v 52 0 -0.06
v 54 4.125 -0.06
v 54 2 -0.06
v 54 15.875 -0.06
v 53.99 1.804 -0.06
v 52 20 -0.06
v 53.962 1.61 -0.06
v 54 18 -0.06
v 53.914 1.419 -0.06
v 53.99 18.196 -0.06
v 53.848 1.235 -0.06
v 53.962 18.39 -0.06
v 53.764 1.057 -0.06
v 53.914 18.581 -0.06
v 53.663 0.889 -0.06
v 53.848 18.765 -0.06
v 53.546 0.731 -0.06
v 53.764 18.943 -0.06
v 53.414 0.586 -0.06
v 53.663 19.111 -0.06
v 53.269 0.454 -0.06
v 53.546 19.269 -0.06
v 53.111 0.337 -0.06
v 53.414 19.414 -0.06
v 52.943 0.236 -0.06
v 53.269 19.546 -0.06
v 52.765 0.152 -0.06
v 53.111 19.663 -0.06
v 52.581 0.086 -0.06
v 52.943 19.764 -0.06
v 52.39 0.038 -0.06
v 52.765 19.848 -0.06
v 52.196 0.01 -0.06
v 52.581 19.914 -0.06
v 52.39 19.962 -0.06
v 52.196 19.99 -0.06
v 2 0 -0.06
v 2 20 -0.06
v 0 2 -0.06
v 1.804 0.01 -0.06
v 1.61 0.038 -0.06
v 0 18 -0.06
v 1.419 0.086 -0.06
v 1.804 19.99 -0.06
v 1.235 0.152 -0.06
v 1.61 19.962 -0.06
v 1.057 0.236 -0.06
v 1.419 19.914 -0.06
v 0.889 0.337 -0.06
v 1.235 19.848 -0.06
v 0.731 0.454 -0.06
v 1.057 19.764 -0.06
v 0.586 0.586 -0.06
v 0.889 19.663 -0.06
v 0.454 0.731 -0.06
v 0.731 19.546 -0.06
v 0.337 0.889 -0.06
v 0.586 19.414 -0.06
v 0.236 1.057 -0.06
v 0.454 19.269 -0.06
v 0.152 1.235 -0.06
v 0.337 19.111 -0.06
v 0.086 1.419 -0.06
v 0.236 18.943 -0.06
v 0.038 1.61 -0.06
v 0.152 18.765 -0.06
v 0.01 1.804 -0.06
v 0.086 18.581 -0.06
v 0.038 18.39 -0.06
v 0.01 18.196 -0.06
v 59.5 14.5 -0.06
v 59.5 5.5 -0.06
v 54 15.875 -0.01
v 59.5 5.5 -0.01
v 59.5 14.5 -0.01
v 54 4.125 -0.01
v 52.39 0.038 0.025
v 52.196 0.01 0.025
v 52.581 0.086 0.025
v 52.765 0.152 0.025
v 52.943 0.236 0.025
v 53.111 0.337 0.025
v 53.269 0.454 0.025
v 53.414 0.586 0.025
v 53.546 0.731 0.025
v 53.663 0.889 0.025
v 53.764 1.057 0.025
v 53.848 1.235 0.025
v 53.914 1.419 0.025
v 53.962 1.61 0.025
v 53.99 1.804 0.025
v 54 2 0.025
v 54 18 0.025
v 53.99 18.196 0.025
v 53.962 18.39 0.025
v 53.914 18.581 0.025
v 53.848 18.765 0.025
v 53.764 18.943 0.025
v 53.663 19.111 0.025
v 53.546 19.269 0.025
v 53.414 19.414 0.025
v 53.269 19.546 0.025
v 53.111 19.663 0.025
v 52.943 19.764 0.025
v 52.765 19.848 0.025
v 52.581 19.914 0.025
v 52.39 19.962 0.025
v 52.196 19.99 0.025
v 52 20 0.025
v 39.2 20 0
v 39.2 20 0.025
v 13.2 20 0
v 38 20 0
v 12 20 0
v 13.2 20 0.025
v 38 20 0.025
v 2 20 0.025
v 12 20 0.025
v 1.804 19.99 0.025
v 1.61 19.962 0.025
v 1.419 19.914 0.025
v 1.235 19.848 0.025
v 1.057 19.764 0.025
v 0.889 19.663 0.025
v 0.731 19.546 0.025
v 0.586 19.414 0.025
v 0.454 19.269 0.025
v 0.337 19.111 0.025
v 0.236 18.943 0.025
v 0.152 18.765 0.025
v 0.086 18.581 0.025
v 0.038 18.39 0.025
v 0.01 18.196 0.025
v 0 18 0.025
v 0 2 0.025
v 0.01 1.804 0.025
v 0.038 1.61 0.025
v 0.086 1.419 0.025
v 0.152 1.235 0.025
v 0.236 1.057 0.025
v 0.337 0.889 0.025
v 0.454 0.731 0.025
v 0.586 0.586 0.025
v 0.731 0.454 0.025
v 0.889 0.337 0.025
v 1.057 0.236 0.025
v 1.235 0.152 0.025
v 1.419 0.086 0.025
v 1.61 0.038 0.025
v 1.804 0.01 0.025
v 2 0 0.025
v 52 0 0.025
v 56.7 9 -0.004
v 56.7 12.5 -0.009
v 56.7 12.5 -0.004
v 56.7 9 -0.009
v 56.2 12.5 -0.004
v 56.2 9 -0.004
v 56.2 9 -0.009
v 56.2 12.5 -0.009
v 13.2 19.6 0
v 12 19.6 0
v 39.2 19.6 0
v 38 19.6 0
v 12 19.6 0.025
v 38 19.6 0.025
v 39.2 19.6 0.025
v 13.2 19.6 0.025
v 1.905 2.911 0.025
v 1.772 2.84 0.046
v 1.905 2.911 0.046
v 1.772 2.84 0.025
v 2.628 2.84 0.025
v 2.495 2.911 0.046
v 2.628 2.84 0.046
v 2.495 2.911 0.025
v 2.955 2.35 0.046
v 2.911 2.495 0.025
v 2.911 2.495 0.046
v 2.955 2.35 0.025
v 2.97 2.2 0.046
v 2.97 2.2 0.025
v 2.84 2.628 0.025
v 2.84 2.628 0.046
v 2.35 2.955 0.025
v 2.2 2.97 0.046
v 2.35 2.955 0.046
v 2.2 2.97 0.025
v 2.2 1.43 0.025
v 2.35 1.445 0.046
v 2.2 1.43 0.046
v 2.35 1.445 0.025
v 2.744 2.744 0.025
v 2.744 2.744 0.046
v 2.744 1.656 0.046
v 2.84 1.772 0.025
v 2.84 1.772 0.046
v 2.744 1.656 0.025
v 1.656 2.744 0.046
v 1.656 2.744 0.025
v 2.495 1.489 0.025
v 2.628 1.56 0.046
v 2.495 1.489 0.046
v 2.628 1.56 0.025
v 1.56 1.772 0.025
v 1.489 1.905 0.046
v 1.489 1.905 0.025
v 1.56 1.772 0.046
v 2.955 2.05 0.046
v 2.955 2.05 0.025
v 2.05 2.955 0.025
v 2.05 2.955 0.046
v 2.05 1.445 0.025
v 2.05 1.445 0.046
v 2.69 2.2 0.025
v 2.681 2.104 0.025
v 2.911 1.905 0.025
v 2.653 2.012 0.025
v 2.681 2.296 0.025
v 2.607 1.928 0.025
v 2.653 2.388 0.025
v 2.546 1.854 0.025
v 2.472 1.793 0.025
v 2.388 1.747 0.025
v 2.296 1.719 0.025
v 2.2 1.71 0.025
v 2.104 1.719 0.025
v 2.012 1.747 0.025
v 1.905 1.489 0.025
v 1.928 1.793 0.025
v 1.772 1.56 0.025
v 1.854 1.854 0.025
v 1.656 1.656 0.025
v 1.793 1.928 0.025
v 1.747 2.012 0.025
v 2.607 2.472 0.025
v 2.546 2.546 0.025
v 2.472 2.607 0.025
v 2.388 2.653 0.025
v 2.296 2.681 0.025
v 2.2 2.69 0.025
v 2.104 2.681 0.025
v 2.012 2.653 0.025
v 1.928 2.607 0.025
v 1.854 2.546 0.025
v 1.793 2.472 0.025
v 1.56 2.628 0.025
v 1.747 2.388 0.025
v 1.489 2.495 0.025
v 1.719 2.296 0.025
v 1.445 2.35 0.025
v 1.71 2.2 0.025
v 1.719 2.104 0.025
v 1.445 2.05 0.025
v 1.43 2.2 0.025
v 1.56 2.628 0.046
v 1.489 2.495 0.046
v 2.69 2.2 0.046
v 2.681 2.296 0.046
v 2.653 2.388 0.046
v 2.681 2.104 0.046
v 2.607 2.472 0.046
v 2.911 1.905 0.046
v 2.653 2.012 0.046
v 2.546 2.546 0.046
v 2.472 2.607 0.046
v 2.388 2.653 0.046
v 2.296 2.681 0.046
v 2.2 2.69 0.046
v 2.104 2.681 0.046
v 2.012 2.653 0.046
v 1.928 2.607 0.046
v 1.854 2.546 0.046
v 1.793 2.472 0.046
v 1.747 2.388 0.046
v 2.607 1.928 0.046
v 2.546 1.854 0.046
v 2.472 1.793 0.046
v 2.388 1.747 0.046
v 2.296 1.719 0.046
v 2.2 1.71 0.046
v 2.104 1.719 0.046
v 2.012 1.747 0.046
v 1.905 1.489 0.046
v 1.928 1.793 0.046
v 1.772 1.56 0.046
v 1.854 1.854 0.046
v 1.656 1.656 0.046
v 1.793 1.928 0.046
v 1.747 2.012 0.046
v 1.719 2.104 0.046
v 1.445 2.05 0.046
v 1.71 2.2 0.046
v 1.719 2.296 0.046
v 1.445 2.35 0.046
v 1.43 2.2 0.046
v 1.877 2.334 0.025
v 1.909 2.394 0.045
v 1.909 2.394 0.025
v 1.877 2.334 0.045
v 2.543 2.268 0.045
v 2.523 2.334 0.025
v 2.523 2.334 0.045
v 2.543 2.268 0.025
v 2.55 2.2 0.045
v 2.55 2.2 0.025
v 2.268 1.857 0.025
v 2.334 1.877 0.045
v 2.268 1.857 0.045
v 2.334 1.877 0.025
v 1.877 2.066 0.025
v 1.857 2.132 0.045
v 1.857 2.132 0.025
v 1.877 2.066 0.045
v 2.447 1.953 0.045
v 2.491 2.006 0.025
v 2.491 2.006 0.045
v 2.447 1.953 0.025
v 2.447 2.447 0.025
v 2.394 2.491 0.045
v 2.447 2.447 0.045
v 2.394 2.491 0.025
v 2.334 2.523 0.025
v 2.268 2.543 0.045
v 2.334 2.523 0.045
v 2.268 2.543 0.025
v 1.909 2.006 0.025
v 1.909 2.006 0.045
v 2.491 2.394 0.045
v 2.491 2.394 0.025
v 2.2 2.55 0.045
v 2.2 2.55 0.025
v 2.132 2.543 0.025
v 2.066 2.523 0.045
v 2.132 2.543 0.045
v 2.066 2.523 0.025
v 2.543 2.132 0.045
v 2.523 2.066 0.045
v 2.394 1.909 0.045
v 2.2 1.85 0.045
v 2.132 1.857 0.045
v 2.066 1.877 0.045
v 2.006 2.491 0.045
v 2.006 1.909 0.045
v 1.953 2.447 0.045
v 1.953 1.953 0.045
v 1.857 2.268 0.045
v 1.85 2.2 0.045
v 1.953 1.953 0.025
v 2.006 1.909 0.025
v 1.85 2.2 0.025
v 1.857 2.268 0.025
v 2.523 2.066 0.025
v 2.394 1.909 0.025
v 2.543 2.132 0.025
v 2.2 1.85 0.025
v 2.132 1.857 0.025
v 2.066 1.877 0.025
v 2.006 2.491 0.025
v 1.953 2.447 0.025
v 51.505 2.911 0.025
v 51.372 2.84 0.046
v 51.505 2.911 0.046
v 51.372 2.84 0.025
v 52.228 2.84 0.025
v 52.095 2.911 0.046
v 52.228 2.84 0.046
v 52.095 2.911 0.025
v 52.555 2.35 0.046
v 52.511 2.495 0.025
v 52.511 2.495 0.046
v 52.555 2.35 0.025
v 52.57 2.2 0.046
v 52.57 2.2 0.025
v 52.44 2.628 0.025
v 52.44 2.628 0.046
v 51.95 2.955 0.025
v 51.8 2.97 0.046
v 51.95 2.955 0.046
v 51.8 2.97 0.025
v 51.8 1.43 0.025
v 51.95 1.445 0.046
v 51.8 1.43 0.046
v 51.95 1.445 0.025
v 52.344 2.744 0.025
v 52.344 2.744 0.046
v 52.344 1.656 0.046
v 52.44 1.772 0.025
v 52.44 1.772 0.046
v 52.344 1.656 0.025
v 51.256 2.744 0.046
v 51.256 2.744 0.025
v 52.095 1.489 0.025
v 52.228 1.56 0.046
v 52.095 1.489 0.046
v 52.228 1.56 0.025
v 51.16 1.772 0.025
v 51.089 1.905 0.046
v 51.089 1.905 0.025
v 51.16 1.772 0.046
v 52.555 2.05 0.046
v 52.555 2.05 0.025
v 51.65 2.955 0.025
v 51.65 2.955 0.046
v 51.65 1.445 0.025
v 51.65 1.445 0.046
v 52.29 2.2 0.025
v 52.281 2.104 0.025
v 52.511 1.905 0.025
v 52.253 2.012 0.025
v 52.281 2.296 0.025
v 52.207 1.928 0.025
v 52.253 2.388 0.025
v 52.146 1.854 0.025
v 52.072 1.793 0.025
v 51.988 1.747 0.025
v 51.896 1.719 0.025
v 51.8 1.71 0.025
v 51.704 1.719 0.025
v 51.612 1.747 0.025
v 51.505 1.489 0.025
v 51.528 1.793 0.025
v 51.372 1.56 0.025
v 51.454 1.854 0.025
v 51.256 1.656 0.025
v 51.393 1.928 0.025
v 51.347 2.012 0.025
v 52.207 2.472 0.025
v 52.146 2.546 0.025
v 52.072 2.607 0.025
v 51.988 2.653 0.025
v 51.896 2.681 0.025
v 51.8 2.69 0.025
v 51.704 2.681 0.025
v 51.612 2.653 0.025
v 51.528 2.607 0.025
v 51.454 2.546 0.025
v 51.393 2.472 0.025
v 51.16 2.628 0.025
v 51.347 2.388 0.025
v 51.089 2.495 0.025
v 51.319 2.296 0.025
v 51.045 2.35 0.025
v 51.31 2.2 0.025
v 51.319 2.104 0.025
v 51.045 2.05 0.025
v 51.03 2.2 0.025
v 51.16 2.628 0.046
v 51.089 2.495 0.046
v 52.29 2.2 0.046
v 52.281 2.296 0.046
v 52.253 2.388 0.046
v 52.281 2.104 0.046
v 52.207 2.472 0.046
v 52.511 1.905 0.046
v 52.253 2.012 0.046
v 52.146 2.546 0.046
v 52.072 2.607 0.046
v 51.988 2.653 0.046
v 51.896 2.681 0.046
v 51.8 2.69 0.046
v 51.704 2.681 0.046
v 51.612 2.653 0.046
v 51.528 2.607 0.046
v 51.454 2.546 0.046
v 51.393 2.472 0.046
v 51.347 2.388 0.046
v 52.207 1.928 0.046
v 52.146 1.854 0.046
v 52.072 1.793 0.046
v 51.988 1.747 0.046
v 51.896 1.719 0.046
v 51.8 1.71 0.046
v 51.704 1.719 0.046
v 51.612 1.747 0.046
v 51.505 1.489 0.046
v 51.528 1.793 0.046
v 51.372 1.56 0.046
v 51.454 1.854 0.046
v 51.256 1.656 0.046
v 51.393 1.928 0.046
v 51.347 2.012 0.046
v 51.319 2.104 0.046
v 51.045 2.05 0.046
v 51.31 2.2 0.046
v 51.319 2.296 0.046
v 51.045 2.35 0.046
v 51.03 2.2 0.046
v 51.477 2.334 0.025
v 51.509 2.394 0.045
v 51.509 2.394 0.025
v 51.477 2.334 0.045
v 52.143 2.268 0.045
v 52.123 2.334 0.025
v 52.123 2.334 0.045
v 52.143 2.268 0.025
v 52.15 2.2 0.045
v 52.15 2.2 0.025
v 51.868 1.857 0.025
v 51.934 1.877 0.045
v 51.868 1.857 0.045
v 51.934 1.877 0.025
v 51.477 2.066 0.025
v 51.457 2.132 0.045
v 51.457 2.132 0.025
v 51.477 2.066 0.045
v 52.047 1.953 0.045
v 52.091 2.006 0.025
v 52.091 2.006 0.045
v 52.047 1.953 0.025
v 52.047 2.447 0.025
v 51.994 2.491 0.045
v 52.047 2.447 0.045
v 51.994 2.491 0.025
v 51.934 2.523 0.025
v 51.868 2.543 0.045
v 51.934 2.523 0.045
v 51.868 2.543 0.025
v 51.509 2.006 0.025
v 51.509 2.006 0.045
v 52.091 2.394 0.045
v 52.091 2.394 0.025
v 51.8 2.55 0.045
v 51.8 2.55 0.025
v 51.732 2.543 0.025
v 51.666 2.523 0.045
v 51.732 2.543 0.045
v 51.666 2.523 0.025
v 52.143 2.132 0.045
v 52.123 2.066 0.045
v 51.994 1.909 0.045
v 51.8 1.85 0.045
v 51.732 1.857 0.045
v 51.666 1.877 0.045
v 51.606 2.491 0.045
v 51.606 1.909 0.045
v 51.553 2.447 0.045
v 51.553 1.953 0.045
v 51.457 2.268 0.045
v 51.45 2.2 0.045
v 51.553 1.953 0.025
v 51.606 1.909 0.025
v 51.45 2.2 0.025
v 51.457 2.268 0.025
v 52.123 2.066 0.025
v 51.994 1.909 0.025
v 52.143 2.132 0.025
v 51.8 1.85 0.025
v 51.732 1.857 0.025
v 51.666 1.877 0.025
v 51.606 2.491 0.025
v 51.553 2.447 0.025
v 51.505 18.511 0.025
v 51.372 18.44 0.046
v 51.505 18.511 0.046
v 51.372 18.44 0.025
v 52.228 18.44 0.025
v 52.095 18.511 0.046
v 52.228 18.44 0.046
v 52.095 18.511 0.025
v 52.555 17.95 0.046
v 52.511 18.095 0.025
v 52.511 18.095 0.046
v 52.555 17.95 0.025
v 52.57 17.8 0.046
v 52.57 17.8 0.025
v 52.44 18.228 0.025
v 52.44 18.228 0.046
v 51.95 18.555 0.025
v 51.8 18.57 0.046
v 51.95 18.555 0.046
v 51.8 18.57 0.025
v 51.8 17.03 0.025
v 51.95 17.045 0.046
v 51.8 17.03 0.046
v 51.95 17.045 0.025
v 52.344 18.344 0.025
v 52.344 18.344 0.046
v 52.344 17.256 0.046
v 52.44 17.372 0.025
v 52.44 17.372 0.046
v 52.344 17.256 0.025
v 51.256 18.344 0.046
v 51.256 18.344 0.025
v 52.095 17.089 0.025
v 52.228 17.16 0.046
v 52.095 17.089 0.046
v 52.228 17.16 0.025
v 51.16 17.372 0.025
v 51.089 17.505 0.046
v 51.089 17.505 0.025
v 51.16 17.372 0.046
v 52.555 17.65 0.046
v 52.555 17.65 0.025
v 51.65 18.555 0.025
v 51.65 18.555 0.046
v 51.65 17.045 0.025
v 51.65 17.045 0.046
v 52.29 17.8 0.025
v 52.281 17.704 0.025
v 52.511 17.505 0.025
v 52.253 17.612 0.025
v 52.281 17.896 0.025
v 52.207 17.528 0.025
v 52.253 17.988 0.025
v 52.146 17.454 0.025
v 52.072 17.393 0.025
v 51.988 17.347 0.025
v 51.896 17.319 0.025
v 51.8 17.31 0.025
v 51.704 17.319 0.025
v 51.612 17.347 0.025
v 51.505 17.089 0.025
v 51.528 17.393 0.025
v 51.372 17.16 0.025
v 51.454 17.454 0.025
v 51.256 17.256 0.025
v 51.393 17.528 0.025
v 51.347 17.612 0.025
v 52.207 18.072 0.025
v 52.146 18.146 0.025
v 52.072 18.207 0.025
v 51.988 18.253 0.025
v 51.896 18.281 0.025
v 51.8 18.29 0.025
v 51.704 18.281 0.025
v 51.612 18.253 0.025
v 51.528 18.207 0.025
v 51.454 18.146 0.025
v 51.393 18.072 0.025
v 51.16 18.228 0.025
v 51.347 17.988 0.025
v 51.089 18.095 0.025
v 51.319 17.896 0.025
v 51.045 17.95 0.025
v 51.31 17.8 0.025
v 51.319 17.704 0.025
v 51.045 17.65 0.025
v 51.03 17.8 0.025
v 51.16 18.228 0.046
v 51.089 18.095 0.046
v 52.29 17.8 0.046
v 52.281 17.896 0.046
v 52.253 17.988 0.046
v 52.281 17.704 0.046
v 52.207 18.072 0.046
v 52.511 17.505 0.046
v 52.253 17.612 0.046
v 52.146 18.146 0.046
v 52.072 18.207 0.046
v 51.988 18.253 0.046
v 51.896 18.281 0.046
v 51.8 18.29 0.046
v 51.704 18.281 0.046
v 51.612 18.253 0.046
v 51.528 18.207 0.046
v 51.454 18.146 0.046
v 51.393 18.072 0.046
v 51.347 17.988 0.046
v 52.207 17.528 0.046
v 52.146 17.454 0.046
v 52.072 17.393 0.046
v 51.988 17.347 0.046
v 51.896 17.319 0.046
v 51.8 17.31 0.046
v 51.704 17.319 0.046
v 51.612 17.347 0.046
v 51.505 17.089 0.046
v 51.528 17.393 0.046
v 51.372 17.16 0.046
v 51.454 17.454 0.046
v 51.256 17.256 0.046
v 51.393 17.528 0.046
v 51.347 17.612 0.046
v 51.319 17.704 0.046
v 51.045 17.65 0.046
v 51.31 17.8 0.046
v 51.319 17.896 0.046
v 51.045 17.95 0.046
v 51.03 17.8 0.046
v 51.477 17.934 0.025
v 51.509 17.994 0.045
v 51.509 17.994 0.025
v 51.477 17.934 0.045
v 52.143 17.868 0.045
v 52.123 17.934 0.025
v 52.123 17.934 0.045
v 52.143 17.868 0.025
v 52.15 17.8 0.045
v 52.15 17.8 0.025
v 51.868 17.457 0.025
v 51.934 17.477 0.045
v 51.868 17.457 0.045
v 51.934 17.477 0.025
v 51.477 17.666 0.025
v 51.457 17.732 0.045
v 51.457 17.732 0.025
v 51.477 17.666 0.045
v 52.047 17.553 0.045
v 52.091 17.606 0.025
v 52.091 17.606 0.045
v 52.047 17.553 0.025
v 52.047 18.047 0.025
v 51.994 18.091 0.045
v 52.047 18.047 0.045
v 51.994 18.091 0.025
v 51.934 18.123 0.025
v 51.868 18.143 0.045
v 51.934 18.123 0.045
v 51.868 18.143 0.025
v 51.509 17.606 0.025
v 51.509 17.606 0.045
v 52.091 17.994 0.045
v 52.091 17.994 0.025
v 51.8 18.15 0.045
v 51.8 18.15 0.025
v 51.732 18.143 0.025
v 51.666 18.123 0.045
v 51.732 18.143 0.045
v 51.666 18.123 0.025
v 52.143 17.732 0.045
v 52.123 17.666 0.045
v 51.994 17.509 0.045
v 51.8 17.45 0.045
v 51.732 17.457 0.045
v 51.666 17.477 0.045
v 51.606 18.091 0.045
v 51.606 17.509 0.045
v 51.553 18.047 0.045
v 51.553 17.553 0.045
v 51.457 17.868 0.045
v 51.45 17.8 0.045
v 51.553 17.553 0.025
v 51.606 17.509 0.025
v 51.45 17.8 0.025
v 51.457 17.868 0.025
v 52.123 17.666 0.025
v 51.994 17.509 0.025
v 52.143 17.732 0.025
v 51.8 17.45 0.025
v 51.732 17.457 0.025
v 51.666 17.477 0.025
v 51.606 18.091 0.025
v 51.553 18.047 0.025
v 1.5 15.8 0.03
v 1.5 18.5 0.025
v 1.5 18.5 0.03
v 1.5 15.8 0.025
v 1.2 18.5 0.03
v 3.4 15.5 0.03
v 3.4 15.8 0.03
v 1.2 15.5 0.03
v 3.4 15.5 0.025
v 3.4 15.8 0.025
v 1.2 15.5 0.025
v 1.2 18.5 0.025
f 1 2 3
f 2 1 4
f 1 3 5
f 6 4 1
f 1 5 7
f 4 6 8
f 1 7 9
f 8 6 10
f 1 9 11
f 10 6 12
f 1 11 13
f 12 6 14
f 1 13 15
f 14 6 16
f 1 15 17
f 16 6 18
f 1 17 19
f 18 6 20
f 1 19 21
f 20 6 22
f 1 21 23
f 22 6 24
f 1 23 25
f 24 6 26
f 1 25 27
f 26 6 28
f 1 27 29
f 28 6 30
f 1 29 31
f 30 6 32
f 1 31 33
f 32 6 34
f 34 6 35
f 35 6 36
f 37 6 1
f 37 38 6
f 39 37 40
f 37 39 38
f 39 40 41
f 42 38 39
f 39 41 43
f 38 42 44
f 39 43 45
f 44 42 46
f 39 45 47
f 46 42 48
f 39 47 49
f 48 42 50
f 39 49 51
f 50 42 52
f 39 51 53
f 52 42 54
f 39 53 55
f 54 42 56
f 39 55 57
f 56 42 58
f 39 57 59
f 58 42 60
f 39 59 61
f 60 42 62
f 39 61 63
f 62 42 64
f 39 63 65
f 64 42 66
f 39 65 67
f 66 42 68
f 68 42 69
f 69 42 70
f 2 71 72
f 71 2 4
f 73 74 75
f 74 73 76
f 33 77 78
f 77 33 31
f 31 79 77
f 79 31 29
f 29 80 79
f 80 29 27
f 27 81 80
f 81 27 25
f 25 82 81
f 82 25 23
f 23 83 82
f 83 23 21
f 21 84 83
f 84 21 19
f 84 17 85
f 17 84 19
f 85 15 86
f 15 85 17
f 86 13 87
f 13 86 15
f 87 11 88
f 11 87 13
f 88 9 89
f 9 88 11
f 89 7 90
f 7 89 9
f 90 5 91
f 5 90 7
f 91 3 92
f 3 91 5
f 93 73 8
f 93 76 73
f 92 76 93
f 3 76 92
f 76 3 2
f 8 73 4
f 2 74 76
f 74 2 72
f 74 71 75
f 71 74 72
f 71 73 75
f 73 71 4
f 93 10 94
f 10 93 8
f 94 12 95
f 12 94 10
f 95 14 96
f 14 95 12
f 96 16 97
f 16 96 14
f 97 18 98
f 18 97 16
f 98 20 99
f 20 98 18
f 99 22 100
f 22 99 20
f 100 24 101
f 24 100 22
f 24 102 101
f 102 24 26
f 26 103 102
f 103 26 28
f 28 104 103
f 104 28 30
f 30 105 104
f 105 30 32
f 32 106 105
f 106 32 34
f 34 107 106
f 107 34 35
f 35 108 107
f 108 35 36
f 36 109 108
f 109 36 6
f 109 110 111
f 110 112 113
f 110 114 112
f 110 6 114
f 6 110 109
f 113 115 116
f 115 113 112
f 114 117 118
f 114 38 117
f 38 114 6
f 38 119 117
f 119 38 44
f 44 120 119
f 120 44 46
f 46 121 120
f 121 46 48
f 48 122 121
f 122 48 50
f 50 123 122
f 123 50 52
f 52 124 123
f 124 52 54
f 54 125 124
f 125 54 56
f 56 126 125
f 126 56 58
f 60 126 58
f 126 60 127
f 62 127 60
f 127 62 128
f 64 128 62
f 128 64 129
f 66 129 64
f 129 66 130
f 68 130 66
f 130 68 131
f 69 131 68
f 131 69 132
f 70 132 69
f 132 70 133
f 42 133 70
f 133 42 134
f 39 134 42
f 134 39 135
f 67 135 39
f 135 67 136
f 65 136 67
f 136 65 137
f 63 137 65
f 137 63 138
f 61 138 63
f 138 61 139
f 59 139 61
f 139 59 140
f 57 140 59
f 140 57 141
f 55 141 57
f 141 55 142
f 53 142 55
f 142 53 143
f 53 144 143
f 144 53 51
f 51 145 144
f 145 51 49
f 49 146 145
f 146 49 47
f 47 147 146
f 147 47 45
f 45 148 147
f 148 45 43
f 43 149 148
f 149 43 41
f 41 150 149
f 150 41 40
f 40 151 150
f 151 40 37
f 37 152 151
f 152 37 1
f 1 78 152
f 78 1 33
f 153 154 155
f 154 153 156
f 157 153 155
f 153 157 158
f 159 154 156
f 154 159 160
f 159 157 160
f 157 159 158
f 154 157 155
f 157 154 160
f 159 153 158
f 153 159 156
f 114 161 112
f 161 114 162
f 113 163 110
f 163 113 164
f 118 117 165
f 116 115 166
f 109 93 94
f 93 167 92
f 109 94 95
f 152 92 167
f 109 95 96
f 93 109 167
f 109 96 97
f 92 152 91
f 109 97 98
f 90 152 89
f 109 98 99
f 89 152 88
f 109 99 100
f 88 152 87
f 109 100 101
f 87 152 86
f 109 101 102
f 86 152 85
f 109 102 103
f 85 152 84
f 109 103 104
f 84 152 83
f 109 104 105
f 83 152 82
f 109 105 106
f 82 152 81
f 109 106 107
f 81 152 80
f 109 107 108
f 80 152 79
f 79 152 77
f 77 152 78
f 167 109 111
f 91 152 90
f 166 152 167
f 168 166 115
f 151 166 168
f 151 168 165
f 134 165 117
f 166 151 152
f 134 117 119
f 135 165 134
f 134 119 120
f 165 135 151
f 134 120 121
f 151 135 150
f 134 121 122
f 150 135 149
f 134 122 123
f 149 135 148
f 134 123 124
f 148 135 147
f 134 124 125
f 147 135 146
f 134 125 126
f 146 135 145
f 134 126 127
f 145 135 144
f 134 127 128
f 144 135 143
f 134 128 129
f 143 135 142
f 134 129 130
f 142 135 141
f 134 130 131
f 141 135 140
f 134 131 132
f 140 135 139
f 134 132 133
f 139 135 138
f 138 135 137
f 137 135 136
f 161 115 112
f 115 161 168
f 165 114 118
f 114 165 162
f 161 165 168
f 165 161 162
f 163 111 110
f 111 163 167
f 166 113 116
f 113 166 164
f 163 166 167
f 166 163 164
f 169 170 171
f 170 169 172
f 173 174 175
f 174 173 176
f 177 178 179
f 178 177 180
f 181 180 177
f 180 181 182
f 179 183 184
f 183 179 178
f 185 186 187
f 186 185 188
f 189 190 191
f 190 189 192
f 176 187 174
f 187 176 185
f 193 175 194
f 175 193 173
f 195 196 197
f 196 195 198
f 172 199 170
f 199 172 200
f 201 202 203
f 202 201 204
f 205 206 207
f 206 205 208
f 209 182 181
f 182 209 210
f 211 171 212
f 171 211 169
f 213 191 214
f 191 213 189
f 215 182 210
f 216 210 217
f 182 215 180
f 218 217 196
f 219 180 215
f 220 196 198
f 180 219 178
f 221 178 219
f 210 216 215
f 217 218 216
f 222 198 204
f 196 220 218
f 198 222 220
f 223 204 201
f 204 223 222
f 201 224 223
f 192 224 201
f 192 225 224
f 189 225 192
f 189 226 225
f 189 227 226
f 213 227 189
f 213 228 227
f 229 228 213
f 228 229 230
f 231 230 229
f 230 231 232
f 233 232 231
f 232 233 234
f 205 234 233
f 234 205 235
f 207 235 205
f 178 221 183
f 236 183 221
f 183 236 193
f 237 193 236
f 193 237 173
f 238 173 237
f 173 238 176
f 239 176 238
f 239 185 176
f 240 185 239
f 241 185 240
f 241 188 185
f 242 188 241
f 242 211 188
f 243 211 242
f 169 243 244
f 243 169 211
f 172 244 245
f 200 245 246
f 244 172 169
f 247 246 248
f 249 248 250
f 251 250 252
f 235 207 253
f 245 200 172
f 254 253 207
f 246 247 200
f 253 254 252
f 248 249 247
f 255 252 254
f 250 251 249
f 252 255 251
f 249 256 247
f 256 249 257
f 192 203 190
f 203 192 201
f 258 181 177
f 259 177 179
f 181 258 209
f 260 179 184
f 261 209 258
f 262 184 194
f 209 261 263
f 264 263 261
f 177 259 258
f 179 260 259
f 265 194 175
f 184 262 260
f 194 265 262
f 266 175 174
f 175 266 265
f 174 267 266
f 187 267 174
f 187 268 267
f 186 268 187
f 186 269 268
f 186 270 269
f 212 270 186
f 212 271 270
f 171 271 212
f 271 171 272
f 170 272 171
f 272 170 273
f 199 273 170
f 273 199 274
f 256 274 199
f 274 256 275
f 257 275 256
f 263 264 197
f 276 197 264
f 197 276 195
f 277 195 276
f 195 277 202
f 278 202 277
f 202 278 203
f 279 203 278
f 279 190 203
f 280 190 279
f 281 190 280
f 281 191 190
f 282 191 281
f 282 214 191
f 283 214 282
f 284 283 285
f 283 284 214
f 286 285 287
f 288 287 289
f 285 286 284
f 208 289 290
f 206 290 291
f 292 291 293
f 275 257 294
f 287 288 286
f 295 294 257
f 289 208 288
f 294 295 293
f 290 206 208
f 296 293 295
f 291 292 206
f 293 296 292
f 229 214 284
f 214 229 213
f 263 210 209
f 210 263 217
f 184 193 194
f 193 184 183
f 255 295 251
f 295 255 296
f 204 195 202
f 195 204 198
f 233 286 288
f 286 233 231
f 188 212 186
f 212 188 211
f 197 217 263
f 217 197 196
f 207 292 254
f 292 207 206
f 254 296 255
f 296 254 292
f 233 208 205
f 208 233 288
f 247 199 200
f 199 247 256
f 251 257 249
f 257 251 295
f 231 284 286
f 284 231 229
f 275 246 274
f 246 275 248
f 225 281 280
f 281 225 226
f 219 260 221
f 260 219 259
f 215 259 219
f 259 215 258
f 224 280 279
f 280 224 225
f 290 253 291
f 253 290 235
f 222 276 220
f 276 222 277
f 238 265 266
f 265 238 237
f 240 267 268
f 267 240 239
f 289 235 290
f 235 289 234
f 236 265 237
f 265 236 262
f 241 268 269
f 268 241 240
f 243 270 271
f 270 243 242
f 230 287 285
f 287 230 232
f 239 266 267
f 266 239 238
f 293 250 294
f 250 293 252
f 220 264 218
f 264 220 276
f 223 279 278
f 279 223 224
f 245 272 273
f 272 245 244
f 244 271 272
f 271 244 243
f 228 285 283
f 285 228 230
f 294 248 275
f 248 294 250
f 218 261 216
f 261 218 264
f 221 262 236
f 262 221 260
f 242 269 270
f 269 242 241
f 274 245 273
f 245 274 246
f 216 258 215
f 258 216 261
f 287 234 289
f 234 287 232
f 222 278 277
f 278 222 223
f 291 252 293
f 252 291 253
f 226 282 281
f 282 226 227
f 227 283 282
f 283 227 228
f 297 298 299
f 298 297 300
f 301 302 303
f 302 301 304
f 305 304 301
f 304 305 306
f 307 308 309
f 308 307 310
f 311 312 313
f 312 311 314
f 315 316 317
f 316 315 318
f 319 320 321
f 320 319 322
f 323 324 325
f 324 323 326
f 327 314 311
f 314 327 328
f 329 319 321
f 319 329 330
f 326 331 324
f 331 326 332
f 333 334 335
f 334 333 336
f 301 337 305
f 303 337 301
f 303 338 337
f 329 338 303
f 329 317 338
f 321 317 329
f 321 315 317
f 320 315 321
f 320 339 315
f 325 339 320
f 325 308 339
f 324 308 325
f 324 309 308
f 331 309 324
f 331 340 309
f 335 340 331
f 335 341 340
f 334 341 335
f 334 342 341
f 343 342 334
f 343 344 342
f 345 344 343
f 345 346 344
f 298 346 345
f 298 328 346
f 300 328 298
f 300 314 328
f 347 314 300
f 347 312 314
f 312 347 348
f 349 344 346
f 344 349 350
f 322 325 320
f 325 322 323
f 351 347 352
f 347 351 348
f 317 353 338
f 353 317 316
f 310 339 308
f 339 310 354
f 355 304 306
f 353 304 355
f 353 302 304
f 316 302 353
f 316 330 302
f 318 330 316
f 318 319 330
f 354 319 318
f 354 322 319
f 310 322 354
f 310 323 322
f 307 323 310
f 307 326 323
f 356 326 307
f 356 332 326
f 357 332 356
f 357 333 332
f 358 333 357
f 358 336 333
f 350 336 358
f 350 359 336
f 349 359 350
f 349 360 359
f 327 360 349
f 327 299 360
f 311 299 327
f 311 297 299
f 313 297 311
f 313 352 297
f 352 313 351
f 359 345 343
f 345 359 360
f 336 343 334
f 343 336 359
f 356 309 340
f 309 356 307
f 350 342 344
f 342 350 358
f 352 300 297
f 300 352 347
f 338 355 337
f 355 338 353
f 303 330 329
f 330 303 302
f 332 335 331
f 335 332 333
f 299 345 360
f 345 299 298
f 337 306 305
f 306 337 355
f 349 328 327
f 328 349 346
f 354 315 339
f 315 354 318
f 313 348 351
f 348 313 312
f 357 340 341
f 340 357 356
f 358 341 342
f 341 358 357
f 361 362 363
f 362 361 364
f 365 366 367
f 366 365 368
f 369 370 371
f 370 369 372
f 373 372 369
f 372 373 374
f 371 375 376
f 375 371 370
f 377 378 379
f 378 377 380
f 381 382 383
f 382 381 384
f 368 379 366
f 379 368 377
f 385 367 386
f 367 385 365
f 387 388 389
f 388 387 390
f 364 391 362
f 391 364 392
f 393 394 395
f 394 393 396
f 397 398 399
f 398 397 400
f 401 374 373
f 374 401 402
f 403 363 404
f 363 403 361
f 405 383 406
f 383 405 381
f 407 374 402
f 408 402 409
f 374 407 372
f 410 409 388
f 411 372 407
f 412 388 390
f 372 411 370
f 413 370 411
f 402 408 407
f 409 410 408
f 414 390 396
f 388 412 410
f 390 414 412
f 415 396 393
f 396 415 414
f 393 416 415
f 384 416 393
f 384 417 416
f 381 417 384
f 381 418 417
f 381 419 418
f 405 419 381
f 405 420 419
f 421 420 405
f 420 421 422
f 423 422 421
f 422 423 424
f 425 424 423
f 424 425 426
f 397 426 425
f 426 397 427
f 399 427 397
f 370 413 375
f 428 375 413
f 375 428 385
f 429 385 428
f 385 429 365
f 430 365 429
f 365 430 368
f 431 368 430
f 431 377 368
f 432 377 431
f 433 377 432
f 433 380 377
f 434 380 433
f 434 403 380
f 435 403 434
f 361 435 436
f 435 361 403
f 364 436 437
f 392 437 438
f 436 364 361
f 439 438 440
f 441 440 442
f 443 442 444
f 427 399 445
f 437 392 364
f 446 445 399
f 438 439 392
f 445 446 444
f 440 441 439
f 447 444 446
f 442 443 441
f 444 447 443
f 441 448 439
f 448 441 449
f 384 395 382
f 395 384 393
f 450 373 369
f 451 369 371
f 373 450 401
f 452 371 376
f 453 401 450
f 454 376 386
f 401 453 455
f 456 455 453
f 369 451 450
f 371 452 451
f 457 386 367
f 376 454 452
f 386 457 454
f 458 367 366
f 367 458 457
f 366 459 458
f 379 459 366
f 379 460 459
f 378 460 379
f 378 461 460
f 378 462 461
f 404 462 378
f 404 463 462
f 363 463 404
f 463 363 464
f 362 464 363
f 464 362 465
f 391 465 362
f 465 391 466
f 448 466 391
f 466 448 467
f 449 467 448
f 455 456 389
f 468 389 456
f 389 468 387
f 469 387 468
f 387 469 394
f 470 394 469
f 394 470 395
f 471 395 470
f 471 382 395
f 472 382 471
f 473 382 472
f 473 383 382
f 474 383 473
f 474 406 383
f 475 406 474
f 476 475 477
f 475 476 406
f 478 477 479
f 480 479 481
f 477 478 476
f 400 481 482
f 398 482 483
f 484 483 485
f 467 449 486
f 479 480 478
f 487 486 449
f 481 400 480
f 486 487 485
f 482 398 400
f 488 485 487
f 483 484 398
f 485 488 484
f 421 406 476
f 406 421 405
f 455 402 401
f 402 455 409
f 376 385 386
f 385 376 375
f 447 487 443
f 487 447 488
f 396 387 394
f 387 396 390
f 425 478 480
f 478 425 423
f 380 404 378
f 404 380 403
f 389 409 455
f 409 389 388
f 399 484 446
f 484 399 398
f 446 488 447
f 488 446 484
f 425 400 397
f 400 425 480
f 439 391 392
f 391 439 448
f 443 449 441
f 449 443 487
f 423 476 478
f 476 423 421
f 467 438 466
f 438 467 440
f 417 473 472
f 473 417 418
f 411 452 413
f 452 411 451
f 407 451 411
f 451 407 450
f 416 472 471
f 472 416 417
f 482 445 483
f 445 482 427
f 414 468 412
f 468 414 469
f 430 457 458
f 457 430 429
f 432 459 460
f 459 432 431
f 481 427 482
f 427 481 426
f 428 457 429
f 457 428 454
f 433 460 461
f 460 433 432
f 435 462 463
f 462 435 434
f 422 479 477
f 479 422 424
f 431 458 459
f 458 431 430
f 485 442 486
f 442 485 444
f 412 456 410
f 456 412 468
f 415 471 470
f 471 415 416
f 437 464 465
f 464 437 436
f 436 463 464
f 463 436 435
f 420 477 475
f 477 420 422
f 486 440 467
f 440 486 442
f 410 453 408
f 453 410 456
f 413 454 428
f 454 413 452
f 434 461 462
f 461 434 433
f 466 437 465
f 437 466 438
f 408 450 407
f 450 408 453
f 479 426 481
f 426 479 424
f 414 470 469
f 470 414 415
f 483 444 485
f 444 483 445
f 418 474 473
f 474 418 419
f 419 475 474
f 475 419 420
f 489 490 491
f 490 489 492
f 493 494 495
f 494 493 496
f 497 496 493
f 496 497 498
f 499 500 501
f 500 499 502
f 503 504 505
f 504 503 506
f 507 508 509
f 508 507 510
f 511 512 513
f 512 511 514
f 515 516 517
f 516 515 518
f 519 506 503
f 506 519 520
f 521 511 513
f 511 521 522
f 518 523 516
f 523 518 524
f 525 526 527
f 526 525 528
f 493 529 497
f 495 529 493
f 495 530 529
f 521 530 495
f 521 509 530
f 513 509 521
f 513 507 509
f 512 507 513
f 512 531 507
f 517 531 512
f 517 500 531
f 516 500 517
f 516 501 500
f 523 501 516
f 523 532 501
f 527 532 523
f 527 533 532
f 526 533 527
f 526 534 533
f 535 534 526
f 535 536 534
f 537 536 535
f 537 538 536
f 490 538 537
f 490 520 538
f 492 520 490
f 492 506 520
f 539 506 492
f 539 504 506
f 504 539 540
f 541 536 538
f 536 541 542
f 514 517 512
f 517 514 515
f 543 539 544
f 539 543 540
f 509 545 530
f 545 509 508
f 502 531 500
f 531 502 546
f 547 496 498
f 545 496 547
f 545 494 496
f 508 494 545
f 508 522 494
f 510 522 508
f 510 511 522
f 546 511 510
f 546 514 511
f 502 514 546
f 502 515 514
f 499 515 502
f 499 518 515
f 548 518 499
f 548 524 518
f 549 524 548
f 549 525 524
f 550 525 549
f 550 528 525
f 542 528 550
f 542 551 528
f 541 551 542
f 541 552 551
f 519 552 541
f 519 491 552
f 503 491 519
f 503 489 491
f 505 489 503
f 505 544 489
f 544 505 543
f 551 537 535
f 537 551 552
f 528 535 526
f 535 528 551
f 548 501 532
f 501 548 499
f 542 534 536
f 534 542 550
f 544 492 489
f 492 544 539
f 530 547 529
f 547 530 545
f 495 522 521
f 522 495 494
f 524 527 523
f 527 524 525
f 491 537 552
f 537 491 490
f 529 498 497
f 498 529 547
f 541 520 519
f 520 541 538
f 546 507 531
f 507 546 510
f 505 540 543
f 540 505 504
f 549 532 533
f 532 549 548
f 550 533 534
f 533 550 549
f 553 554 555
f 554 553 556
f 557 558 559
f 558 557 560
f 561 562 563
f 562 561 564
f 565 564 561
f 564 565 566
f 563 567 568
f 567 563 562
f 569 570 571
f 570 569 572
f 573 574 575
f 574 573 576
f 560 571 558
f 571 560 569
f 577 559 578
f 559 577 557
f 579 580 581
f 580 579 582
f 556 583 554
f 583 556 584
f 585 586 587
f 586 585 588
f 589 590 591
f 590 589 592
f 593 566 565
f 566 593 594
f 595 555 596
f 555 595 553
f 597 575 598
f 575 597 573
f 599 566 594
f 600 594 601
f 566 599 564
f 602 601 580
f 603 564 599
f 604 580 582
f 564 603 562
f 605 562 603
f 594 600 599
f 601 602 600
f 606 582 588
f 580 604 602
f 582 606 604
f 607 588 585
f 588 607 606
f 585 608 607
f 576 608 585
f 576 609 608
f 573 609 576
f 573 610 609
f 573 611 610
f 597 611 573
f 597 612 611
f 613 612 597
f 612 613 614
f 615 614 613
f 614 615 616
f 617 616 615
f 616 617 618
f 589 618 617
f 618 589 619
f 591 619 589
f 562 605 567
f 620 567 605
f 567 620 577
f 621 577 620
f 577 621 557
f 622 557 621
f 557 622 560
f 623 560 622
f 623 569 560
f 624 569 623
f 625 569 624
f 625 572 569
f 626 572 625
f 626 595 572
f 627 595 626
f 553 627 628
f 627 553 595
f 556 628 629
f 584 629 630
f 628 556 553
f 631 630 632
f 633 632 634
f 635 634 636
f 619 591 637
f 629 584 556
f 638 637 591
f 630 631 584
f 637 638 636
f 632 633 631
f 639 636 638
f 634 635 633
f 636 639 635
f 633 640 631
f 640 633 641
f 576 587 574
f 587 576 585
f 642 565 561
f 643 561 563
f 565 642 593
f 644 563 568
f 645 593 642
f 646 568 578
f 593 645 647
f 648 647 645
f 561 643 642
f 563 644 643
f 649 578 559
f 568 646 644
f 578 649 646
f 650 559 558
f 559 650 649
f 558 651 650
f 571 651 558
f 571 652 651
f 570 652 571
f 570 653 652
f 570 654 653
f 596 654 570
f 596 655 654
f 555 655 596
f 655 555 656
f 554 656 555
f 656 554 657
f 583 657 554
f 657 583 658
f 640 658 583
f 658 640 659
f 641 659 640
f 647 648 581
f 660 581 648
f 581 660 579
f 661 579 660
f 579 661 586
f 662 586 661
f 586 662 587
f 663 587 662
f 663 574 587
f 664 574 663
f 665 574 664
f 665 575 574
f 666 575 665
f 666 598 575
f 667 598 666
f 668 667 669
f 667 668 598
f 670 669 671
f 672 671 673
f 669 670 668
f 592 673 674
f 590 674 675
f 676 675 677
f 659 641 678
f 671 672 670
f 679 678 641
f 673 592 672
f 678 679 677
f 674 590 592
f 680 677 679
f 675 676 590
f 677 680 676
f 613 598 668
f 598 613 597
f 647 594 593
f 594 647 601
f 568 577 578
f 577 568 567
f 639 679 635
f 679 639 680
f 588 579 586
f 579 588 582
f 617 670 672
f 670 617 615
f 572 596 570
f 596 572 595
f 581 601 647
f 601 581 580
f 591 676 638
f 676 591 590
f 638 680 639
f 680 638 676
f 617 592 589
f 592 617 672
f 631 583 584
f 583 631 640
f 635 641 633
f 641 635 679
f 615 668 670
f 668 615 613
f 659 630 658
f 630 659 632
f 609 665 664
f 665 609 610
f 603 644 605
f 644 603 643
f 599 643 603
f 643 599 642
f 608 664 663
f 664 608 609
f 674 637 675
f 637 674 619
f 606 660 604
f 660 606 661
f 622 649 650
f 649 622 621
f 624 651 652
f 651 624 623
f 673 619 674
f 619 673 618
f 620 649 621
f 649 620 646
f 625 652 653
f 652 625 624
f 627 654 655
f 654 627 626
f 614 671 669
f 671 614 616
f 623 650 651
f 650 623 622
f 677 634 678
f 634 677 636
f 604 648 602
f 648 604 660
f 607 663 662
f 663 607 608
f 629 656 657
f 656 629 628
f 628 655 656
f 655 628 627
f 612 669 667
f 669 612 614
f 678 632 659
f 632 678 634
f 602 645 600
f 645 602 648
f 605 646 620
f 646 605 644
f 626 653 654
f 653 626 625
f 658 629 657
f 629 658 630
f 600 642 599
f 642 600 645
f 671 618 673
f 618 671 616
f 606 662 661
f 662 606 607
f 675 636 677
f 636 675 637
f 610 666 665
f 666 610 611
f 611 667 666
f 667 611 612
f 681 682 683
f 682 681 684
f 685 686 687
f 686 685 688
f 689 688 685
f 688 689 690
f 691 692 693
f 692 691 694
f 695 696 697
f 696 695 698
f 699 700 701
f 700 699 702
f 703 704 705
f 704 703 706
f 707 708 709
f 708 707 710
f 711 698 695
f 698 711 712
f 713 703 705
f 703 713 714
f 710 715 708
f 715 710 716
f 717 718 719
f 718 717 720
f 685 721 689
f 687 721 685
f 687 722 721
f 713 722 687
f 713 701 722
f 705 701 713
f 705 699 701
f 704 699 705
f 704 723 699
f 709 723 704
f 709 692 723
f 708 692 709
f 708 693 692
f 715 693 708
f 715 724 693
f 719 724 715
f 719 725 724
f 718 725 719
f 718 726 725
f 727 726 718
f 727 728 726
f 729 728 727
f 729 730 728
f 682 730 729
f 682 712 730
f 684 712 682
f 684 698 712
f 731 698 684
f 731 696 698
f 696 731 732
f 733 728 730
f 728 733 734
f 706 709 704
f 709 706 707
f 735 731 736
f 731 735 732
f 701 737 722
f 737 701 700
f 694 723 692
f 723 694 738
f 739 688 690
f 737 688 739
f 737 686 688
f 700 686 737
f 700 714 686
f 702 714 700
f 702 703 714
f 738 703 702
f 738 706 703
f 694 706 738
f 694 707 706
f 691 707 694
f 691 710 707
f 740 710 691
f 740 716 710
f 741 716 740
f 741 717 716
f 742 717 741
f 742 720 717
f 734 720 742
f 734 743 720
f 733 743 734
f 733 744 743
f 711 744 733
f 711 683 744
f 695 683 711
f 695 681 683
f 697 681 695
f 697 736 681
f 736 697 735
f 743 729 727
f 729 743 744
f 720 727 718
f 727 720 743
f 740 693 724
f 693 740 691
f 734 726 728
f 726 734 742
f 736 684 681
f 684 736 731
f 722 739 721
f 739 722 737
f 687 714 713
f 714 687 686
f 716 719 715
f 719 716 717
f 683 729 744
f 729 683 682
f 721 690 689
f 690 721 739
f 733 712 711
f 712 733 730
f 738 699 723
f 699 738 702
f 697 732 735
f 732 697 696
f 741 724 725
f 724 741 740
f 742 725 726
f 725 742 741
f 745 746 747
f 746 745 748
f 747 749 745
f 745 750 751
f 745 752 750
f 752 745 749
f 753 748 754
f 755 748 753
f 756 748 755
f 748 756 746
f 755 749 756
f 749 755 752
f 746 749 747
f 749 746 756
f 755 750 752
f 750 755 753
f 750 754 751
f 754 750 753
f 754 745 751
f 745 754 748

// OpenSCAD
// file: ../Common/params.scad
// =========================================================================
// PencilAI - Common Parameters, Colors & Utility Library
// File: CAD Modelling/Common/params.scad
// =========================================================================

// --- Resolution Settings ---
$fn = 64;

// --- Physical Strip Dimensions (mm) ---
STRIP_LEN        = 54.0;   // Length of flexible tape (wraps ~1.9x on 9mm barrel)
STRIP_WID        = 20.0;   // Width of tape along the pen axis (grip zone height)
STRIP_CORNER_R   = 2.0;    // Rounded corner radius to prevent peeling

// --- Layer Heights & Z-Stackup (mm) ---
THICK_ADHESIVE   = 0.055;  // Skin-safe medical acrylic adhesive
THICK_KAPTON     = 0.025;  // Flexible Polyimide film substrate (25 um)
THICK_BASE       = THICK_ADHESIVE + THICK_KAPTON; // 0.080 mm base

THICK_COPPER     = 0.020;  // Etched copper traces (1/2 oz / 18-20 um)
THICK_GOLD       = 0.005;  // ENIG surface finish plating
THICK_CARBON     = 0.030;  // Screen-printed carbon resistive ink (30 um)
THICK_SPACER     = 0.015;  // Dielectric spacer dot height

THICK_TPU_SKIN   = 0.450;  // Translucent matte TPU outer protective grip film
THICK_TOTAL_MAX  = 0.530;  // Target total profile thickness: 0.53 mm

// --- Component Dimensions (mm) ---
// ST LIS2DH12 Ultra-low-power 3-axis accelerometer (WLCSP-12)
ACCEL_LEN        = 1.60;
ACCEL_WID        = 1.60;
ACCEL_H          = 0.40;   // Ultra-thin WLCSP package
ACCEL_BALL_PITCH = 0.40;   // 3x4 solder ball matrix
ACCEL_BALL_DIA   = 0.22;

// BLE Beacon SoC (InPlay IN100 / Nordic nRF52810 WLCSP)
BLE_LEN          = 2.20;
BLE_WID          = 2.20;
BLE_H            = 0.35;   // 0.35 mm profile
BLE_BALL_PITCH   = 0.45;   // 4x4 solder ball matrix
BLE_BALL_DIA     = 0.24;

// Ultra-Thin Printed Zinc-Manganese (Zn-Mn) Flexible Battery
BAT_LEN          = 16.5;   // Main pouch length
BAT_WID          = 12.6;   // Main pouch width
BAT_H            = 0.45;   // Printed paper battery thickness (0.45 mm)
BAT_SEAL_MARGIN  = 1.0;    // Perimeter foil crimp seal width
BAT_TAB_LEN      = 2.4;    // Terminal connector tab length
BAT_TAB_WID      = 1.2;    // Terminal tab width

// Interdigitated Carbon FSR Pinch Zone
FSR_LEN          = 17.5;
FSR_WID          = 13.6;
FSR_FINGERS      = 16;
FSR_BUS_WID      = 0.60;

// Serpentine 2.4 GHz Antenna
ANT_LOOPS        = 6;
ANT_STEP         = 1.40;
ANT_AMP          = 2.40;
ANT_TRACE_WID    = 0.35;

// Reference Pen
PEN_DIAMETER_DEFAULT = 9.0; // Standard ballpoint barrel (mm)

// --- Color Palette (RGBA) ---
C_KAPTON         = [0.85, 0.48, 0.08, 0.88]; // Translucent Amber Polyimide
C_ADHESIVE       = [0.95, 0.95, 0.92, 0.50]; // Clear skin-safe acrylic adhesive
C_RELEASE_LINER  = [0.98, 0.98, 0.96, 0.95]; // White silicone-coated pull tab
C_TPU_SKIN       = [0.18, 0.19, 0.22, 0.55]; // Translucent Charcoal Matte TPU
C_TPU_OPAQUE     = [0.14, 0.15, 0.17, 1.00]; // Grip ridges / tactile accents
C_COPPER         = [0.85, 0.45, 0.22, 1.00]; // Raw Etched Copper
C_GOLD           = [0.92, 0.74, 0.20, 1.00]; // ENIG Gold Plating
C_CARBON         = [0.12, 0.12, 0.13, 0.98]; // Screen-Printed Carbon Ink
C_DIELECTRIC     = [0.20, 0.65, 0.40, 0.75]; // Green/Teal Dielectric Spacer
C_SILICON        = [0.09, 0.10, 0.12, 1.00]; // WLCSP Mirror Silicon Die
C_SOLDER         = [0.76, 0.78, 0.82, 1.00]; // SAC305 Lead-Free Solder
C_CERAMIC        = [0.70, 0.58, 0.46, 1.00]; // 0201 MLCC Brown Ceramic
C_BATTERY_FOIL   = [0.80, 0.82, 0.85, 1.00]; // Hermetic Aluminum/Poly Pouch
C_BATTERY_SEAL   = [0.65, 0.67, 0.70, 1.00]; // Crimped Pouch Flange
C_BAT_ACCENT     = [0.15, 0.45, 0.75, 1.00]; // Insulator Layer / Branding
C_PEN_BARREL     = [0.93, 0.94, 0.96, 0.90]; // Smooth Polycarbonate Barrel
C_PEN_CHROME     = [0.84, 0.86, 0.89, 1.00]; // Mirror Chrome Trim
C_PEN_BRASS      = [0.86, 0.70, 0.28, 1.00]; // Machined Brass Tip Collar
C_PEN_BALL       = [0.35, 0.36, 0.38, 1.00]; // Tungsten Carbide Ball
C_PEN_INK        = [0.05, 0.10, 0.35, 1.00]; // Blue Ink Column inside refill

// --- Reusable Geometric Modules ---

// 2D Rounded Rectangle (Centered or Corner Origin)
module rounded_rect_2d(length, width, radius, center = false) {
    tx = center ? -length / 2 : 0;
    ty = center ? -width / 2 : 0;
    translate([tx, ty])
        offset(r = radius)
            offset(delta = -radius)
                square([length, width]);
}

// 3D Rounded Extruded Plate
module rounded_box(length, width, height, radius, center = false) {
    linear_extrude(height = height)
        rounded_rect_2d(length, width, radius, center = center);
}

// Spherical Solder Ball
module solder_ball(diameter) {
    color(C_SOLDER)
        sphere(d = diameter, $fn = 32);
}

// SMD 0201 / 01005 Passive Component (Capacitor / Inductor / Resistor)
module smd_passive_0201(len = 0.60, wid = 0.30, height = 0.30, body_color = C_CERAMIC) {
    term_len = 0.15;
    // Central Ceramic/Ferrite Body
    color(body_color)
        translate([term_len, 0, 0])
            cube([len - 2 * term_len, wid, height]);
    // Silver End Terminations
    color(C_SOLDER) {
        cube([term_len, wid, height]);
        translate([len - term_len, 0, 0])
            cube([term_len, wid, height]);
    }
}

// Circular Fiducial Alignment Marker (for high-precision flex assembly)
module fiducial_marker(diameter = 1.0, copper_h = THICK_COPPER) {
    color(C_GOLD)
        cylinder(d = diameter, h = copper_h, $fn = 32);
    color(C_KAPTON)
        difference() {
            cylinder(d = diameter * 2.2, h = copper_h + 0.001, $fn = 32);
            cylinder(d = diameter * 1.4, h = copper_h + 0.002, $fn = 32);
        }
}
// main file
// =========================================================================
// PencilAI - Polyimide Substrate & Adhesive Base Layer
// File: CAD Modelling/Substrate/polyimide_substrate.scad
// =========================================================================

include <../Common/params.scad>

// --- View Controls (when rendered directly) ---
show_release_liner = true;  // Show peelable paper backing with pull tab
show_fiducials     = true;  // Optical pick-and-place fiducial targets
show_peel_tab      = true;  // Extended pull-tab for easy application

module substrate_layer(show_liner = show_release_liner, show_tab = show_peel_tab) {
    // 1. Release Liner (Peel-off protective paper/PET with pull tab)
    if (show_liner) {
        color(C_RELEASE_LINER) {
            // Liner sits beneath the adhesive layer
            translate([0, 0, -0.060]) {
                linear_extrude(height = 0.050) {
                    rounded_rect_2d(STRIP_LEN, STRIP_WID, STRIP_CORNER_R);
                    // Extended easy-peel tab on the short edge
                    if (show_tab) {
                        translate([STRIP_LEN - 0.5, 4.0])
                            polygon(points = [
                                [0, 0], [6.0, 1.5], [6.0, 10.5], [0, 12.0]
                            ]);
                    }
                }
            }
        }
        // "PEEL HERE" chevron indicator mark on the tab
        if (show_tab) {
            color([0.2, 0.2, 0.2, 0.8])
                translate([STRIP_LEN + 2.2, 9.0, -0.009])
                    cube([0.5, 3.5, 0.005]);
        }
    }

    // 2. Skin-Safe Pressure-Sensitive Adhesive (PSA) Layer (55 um)
    color(C_ADHESIVE)
        translate([0, 0, -THICK_ADHESIVE])
            rounded_box(STRIP_LEN, STRIP_WID, THICK_ADHESIVE, STRIP_CORNER_R);

    // 3. Flexible Polyimide (Kapton) Base Substrate (25 um)
    color(C_KAPTON)
        difference() {
            rounded_box(STRIP_LEN, STRIP_WID, THICK_KAPTON, STRIP_CORNER_R);

            // Alignment notches along upper edge for tooling jig
            translate([12.0, STRIP_WID - 0.4, -0.001])
                cube([1.2, 0.5, THICK_KAPTON + 0.002]);
            translate([38.0, STRIP_WID - 0.4, -0.001])
                cube([1.2, 0.5, THICK_KAPTON + 0.002]);
        }

    // 4. Optical Alignment Fiducials & Calibration Guide Printing
    if (show_fiducials) {
        // Corner fiducials for PCB assembly
        translate([2.2, 2.2, THICK_KAPTON])
            fiducial_marker(0.7);
        translate([STRIP_LEN - 2.2, 2.2, THICK_KAPTON])
            fiducial_marker(0.7);
        translate([STRIP_LEN - 2.2, STRIP_WID - 2.2, THICK_KAPTON])
            fiducial_marker(0.7);

        // Printed "L"-Calibration Icon silk guide near the start of the tape
        color([0.9, 0.9, 0.9, 0.9])
            translate([1.2, STRIP_WID - 4.5, THICK_KAPTON]) {
                // Vertical stroke of "L"
                cube([0.3, 3.0, 0.005]);
                // Horizontal stroke of "L"
                cube([2.2, 0.3, 0.005]);
            }
    }
}

// Standalone Render
substrate_layer();
